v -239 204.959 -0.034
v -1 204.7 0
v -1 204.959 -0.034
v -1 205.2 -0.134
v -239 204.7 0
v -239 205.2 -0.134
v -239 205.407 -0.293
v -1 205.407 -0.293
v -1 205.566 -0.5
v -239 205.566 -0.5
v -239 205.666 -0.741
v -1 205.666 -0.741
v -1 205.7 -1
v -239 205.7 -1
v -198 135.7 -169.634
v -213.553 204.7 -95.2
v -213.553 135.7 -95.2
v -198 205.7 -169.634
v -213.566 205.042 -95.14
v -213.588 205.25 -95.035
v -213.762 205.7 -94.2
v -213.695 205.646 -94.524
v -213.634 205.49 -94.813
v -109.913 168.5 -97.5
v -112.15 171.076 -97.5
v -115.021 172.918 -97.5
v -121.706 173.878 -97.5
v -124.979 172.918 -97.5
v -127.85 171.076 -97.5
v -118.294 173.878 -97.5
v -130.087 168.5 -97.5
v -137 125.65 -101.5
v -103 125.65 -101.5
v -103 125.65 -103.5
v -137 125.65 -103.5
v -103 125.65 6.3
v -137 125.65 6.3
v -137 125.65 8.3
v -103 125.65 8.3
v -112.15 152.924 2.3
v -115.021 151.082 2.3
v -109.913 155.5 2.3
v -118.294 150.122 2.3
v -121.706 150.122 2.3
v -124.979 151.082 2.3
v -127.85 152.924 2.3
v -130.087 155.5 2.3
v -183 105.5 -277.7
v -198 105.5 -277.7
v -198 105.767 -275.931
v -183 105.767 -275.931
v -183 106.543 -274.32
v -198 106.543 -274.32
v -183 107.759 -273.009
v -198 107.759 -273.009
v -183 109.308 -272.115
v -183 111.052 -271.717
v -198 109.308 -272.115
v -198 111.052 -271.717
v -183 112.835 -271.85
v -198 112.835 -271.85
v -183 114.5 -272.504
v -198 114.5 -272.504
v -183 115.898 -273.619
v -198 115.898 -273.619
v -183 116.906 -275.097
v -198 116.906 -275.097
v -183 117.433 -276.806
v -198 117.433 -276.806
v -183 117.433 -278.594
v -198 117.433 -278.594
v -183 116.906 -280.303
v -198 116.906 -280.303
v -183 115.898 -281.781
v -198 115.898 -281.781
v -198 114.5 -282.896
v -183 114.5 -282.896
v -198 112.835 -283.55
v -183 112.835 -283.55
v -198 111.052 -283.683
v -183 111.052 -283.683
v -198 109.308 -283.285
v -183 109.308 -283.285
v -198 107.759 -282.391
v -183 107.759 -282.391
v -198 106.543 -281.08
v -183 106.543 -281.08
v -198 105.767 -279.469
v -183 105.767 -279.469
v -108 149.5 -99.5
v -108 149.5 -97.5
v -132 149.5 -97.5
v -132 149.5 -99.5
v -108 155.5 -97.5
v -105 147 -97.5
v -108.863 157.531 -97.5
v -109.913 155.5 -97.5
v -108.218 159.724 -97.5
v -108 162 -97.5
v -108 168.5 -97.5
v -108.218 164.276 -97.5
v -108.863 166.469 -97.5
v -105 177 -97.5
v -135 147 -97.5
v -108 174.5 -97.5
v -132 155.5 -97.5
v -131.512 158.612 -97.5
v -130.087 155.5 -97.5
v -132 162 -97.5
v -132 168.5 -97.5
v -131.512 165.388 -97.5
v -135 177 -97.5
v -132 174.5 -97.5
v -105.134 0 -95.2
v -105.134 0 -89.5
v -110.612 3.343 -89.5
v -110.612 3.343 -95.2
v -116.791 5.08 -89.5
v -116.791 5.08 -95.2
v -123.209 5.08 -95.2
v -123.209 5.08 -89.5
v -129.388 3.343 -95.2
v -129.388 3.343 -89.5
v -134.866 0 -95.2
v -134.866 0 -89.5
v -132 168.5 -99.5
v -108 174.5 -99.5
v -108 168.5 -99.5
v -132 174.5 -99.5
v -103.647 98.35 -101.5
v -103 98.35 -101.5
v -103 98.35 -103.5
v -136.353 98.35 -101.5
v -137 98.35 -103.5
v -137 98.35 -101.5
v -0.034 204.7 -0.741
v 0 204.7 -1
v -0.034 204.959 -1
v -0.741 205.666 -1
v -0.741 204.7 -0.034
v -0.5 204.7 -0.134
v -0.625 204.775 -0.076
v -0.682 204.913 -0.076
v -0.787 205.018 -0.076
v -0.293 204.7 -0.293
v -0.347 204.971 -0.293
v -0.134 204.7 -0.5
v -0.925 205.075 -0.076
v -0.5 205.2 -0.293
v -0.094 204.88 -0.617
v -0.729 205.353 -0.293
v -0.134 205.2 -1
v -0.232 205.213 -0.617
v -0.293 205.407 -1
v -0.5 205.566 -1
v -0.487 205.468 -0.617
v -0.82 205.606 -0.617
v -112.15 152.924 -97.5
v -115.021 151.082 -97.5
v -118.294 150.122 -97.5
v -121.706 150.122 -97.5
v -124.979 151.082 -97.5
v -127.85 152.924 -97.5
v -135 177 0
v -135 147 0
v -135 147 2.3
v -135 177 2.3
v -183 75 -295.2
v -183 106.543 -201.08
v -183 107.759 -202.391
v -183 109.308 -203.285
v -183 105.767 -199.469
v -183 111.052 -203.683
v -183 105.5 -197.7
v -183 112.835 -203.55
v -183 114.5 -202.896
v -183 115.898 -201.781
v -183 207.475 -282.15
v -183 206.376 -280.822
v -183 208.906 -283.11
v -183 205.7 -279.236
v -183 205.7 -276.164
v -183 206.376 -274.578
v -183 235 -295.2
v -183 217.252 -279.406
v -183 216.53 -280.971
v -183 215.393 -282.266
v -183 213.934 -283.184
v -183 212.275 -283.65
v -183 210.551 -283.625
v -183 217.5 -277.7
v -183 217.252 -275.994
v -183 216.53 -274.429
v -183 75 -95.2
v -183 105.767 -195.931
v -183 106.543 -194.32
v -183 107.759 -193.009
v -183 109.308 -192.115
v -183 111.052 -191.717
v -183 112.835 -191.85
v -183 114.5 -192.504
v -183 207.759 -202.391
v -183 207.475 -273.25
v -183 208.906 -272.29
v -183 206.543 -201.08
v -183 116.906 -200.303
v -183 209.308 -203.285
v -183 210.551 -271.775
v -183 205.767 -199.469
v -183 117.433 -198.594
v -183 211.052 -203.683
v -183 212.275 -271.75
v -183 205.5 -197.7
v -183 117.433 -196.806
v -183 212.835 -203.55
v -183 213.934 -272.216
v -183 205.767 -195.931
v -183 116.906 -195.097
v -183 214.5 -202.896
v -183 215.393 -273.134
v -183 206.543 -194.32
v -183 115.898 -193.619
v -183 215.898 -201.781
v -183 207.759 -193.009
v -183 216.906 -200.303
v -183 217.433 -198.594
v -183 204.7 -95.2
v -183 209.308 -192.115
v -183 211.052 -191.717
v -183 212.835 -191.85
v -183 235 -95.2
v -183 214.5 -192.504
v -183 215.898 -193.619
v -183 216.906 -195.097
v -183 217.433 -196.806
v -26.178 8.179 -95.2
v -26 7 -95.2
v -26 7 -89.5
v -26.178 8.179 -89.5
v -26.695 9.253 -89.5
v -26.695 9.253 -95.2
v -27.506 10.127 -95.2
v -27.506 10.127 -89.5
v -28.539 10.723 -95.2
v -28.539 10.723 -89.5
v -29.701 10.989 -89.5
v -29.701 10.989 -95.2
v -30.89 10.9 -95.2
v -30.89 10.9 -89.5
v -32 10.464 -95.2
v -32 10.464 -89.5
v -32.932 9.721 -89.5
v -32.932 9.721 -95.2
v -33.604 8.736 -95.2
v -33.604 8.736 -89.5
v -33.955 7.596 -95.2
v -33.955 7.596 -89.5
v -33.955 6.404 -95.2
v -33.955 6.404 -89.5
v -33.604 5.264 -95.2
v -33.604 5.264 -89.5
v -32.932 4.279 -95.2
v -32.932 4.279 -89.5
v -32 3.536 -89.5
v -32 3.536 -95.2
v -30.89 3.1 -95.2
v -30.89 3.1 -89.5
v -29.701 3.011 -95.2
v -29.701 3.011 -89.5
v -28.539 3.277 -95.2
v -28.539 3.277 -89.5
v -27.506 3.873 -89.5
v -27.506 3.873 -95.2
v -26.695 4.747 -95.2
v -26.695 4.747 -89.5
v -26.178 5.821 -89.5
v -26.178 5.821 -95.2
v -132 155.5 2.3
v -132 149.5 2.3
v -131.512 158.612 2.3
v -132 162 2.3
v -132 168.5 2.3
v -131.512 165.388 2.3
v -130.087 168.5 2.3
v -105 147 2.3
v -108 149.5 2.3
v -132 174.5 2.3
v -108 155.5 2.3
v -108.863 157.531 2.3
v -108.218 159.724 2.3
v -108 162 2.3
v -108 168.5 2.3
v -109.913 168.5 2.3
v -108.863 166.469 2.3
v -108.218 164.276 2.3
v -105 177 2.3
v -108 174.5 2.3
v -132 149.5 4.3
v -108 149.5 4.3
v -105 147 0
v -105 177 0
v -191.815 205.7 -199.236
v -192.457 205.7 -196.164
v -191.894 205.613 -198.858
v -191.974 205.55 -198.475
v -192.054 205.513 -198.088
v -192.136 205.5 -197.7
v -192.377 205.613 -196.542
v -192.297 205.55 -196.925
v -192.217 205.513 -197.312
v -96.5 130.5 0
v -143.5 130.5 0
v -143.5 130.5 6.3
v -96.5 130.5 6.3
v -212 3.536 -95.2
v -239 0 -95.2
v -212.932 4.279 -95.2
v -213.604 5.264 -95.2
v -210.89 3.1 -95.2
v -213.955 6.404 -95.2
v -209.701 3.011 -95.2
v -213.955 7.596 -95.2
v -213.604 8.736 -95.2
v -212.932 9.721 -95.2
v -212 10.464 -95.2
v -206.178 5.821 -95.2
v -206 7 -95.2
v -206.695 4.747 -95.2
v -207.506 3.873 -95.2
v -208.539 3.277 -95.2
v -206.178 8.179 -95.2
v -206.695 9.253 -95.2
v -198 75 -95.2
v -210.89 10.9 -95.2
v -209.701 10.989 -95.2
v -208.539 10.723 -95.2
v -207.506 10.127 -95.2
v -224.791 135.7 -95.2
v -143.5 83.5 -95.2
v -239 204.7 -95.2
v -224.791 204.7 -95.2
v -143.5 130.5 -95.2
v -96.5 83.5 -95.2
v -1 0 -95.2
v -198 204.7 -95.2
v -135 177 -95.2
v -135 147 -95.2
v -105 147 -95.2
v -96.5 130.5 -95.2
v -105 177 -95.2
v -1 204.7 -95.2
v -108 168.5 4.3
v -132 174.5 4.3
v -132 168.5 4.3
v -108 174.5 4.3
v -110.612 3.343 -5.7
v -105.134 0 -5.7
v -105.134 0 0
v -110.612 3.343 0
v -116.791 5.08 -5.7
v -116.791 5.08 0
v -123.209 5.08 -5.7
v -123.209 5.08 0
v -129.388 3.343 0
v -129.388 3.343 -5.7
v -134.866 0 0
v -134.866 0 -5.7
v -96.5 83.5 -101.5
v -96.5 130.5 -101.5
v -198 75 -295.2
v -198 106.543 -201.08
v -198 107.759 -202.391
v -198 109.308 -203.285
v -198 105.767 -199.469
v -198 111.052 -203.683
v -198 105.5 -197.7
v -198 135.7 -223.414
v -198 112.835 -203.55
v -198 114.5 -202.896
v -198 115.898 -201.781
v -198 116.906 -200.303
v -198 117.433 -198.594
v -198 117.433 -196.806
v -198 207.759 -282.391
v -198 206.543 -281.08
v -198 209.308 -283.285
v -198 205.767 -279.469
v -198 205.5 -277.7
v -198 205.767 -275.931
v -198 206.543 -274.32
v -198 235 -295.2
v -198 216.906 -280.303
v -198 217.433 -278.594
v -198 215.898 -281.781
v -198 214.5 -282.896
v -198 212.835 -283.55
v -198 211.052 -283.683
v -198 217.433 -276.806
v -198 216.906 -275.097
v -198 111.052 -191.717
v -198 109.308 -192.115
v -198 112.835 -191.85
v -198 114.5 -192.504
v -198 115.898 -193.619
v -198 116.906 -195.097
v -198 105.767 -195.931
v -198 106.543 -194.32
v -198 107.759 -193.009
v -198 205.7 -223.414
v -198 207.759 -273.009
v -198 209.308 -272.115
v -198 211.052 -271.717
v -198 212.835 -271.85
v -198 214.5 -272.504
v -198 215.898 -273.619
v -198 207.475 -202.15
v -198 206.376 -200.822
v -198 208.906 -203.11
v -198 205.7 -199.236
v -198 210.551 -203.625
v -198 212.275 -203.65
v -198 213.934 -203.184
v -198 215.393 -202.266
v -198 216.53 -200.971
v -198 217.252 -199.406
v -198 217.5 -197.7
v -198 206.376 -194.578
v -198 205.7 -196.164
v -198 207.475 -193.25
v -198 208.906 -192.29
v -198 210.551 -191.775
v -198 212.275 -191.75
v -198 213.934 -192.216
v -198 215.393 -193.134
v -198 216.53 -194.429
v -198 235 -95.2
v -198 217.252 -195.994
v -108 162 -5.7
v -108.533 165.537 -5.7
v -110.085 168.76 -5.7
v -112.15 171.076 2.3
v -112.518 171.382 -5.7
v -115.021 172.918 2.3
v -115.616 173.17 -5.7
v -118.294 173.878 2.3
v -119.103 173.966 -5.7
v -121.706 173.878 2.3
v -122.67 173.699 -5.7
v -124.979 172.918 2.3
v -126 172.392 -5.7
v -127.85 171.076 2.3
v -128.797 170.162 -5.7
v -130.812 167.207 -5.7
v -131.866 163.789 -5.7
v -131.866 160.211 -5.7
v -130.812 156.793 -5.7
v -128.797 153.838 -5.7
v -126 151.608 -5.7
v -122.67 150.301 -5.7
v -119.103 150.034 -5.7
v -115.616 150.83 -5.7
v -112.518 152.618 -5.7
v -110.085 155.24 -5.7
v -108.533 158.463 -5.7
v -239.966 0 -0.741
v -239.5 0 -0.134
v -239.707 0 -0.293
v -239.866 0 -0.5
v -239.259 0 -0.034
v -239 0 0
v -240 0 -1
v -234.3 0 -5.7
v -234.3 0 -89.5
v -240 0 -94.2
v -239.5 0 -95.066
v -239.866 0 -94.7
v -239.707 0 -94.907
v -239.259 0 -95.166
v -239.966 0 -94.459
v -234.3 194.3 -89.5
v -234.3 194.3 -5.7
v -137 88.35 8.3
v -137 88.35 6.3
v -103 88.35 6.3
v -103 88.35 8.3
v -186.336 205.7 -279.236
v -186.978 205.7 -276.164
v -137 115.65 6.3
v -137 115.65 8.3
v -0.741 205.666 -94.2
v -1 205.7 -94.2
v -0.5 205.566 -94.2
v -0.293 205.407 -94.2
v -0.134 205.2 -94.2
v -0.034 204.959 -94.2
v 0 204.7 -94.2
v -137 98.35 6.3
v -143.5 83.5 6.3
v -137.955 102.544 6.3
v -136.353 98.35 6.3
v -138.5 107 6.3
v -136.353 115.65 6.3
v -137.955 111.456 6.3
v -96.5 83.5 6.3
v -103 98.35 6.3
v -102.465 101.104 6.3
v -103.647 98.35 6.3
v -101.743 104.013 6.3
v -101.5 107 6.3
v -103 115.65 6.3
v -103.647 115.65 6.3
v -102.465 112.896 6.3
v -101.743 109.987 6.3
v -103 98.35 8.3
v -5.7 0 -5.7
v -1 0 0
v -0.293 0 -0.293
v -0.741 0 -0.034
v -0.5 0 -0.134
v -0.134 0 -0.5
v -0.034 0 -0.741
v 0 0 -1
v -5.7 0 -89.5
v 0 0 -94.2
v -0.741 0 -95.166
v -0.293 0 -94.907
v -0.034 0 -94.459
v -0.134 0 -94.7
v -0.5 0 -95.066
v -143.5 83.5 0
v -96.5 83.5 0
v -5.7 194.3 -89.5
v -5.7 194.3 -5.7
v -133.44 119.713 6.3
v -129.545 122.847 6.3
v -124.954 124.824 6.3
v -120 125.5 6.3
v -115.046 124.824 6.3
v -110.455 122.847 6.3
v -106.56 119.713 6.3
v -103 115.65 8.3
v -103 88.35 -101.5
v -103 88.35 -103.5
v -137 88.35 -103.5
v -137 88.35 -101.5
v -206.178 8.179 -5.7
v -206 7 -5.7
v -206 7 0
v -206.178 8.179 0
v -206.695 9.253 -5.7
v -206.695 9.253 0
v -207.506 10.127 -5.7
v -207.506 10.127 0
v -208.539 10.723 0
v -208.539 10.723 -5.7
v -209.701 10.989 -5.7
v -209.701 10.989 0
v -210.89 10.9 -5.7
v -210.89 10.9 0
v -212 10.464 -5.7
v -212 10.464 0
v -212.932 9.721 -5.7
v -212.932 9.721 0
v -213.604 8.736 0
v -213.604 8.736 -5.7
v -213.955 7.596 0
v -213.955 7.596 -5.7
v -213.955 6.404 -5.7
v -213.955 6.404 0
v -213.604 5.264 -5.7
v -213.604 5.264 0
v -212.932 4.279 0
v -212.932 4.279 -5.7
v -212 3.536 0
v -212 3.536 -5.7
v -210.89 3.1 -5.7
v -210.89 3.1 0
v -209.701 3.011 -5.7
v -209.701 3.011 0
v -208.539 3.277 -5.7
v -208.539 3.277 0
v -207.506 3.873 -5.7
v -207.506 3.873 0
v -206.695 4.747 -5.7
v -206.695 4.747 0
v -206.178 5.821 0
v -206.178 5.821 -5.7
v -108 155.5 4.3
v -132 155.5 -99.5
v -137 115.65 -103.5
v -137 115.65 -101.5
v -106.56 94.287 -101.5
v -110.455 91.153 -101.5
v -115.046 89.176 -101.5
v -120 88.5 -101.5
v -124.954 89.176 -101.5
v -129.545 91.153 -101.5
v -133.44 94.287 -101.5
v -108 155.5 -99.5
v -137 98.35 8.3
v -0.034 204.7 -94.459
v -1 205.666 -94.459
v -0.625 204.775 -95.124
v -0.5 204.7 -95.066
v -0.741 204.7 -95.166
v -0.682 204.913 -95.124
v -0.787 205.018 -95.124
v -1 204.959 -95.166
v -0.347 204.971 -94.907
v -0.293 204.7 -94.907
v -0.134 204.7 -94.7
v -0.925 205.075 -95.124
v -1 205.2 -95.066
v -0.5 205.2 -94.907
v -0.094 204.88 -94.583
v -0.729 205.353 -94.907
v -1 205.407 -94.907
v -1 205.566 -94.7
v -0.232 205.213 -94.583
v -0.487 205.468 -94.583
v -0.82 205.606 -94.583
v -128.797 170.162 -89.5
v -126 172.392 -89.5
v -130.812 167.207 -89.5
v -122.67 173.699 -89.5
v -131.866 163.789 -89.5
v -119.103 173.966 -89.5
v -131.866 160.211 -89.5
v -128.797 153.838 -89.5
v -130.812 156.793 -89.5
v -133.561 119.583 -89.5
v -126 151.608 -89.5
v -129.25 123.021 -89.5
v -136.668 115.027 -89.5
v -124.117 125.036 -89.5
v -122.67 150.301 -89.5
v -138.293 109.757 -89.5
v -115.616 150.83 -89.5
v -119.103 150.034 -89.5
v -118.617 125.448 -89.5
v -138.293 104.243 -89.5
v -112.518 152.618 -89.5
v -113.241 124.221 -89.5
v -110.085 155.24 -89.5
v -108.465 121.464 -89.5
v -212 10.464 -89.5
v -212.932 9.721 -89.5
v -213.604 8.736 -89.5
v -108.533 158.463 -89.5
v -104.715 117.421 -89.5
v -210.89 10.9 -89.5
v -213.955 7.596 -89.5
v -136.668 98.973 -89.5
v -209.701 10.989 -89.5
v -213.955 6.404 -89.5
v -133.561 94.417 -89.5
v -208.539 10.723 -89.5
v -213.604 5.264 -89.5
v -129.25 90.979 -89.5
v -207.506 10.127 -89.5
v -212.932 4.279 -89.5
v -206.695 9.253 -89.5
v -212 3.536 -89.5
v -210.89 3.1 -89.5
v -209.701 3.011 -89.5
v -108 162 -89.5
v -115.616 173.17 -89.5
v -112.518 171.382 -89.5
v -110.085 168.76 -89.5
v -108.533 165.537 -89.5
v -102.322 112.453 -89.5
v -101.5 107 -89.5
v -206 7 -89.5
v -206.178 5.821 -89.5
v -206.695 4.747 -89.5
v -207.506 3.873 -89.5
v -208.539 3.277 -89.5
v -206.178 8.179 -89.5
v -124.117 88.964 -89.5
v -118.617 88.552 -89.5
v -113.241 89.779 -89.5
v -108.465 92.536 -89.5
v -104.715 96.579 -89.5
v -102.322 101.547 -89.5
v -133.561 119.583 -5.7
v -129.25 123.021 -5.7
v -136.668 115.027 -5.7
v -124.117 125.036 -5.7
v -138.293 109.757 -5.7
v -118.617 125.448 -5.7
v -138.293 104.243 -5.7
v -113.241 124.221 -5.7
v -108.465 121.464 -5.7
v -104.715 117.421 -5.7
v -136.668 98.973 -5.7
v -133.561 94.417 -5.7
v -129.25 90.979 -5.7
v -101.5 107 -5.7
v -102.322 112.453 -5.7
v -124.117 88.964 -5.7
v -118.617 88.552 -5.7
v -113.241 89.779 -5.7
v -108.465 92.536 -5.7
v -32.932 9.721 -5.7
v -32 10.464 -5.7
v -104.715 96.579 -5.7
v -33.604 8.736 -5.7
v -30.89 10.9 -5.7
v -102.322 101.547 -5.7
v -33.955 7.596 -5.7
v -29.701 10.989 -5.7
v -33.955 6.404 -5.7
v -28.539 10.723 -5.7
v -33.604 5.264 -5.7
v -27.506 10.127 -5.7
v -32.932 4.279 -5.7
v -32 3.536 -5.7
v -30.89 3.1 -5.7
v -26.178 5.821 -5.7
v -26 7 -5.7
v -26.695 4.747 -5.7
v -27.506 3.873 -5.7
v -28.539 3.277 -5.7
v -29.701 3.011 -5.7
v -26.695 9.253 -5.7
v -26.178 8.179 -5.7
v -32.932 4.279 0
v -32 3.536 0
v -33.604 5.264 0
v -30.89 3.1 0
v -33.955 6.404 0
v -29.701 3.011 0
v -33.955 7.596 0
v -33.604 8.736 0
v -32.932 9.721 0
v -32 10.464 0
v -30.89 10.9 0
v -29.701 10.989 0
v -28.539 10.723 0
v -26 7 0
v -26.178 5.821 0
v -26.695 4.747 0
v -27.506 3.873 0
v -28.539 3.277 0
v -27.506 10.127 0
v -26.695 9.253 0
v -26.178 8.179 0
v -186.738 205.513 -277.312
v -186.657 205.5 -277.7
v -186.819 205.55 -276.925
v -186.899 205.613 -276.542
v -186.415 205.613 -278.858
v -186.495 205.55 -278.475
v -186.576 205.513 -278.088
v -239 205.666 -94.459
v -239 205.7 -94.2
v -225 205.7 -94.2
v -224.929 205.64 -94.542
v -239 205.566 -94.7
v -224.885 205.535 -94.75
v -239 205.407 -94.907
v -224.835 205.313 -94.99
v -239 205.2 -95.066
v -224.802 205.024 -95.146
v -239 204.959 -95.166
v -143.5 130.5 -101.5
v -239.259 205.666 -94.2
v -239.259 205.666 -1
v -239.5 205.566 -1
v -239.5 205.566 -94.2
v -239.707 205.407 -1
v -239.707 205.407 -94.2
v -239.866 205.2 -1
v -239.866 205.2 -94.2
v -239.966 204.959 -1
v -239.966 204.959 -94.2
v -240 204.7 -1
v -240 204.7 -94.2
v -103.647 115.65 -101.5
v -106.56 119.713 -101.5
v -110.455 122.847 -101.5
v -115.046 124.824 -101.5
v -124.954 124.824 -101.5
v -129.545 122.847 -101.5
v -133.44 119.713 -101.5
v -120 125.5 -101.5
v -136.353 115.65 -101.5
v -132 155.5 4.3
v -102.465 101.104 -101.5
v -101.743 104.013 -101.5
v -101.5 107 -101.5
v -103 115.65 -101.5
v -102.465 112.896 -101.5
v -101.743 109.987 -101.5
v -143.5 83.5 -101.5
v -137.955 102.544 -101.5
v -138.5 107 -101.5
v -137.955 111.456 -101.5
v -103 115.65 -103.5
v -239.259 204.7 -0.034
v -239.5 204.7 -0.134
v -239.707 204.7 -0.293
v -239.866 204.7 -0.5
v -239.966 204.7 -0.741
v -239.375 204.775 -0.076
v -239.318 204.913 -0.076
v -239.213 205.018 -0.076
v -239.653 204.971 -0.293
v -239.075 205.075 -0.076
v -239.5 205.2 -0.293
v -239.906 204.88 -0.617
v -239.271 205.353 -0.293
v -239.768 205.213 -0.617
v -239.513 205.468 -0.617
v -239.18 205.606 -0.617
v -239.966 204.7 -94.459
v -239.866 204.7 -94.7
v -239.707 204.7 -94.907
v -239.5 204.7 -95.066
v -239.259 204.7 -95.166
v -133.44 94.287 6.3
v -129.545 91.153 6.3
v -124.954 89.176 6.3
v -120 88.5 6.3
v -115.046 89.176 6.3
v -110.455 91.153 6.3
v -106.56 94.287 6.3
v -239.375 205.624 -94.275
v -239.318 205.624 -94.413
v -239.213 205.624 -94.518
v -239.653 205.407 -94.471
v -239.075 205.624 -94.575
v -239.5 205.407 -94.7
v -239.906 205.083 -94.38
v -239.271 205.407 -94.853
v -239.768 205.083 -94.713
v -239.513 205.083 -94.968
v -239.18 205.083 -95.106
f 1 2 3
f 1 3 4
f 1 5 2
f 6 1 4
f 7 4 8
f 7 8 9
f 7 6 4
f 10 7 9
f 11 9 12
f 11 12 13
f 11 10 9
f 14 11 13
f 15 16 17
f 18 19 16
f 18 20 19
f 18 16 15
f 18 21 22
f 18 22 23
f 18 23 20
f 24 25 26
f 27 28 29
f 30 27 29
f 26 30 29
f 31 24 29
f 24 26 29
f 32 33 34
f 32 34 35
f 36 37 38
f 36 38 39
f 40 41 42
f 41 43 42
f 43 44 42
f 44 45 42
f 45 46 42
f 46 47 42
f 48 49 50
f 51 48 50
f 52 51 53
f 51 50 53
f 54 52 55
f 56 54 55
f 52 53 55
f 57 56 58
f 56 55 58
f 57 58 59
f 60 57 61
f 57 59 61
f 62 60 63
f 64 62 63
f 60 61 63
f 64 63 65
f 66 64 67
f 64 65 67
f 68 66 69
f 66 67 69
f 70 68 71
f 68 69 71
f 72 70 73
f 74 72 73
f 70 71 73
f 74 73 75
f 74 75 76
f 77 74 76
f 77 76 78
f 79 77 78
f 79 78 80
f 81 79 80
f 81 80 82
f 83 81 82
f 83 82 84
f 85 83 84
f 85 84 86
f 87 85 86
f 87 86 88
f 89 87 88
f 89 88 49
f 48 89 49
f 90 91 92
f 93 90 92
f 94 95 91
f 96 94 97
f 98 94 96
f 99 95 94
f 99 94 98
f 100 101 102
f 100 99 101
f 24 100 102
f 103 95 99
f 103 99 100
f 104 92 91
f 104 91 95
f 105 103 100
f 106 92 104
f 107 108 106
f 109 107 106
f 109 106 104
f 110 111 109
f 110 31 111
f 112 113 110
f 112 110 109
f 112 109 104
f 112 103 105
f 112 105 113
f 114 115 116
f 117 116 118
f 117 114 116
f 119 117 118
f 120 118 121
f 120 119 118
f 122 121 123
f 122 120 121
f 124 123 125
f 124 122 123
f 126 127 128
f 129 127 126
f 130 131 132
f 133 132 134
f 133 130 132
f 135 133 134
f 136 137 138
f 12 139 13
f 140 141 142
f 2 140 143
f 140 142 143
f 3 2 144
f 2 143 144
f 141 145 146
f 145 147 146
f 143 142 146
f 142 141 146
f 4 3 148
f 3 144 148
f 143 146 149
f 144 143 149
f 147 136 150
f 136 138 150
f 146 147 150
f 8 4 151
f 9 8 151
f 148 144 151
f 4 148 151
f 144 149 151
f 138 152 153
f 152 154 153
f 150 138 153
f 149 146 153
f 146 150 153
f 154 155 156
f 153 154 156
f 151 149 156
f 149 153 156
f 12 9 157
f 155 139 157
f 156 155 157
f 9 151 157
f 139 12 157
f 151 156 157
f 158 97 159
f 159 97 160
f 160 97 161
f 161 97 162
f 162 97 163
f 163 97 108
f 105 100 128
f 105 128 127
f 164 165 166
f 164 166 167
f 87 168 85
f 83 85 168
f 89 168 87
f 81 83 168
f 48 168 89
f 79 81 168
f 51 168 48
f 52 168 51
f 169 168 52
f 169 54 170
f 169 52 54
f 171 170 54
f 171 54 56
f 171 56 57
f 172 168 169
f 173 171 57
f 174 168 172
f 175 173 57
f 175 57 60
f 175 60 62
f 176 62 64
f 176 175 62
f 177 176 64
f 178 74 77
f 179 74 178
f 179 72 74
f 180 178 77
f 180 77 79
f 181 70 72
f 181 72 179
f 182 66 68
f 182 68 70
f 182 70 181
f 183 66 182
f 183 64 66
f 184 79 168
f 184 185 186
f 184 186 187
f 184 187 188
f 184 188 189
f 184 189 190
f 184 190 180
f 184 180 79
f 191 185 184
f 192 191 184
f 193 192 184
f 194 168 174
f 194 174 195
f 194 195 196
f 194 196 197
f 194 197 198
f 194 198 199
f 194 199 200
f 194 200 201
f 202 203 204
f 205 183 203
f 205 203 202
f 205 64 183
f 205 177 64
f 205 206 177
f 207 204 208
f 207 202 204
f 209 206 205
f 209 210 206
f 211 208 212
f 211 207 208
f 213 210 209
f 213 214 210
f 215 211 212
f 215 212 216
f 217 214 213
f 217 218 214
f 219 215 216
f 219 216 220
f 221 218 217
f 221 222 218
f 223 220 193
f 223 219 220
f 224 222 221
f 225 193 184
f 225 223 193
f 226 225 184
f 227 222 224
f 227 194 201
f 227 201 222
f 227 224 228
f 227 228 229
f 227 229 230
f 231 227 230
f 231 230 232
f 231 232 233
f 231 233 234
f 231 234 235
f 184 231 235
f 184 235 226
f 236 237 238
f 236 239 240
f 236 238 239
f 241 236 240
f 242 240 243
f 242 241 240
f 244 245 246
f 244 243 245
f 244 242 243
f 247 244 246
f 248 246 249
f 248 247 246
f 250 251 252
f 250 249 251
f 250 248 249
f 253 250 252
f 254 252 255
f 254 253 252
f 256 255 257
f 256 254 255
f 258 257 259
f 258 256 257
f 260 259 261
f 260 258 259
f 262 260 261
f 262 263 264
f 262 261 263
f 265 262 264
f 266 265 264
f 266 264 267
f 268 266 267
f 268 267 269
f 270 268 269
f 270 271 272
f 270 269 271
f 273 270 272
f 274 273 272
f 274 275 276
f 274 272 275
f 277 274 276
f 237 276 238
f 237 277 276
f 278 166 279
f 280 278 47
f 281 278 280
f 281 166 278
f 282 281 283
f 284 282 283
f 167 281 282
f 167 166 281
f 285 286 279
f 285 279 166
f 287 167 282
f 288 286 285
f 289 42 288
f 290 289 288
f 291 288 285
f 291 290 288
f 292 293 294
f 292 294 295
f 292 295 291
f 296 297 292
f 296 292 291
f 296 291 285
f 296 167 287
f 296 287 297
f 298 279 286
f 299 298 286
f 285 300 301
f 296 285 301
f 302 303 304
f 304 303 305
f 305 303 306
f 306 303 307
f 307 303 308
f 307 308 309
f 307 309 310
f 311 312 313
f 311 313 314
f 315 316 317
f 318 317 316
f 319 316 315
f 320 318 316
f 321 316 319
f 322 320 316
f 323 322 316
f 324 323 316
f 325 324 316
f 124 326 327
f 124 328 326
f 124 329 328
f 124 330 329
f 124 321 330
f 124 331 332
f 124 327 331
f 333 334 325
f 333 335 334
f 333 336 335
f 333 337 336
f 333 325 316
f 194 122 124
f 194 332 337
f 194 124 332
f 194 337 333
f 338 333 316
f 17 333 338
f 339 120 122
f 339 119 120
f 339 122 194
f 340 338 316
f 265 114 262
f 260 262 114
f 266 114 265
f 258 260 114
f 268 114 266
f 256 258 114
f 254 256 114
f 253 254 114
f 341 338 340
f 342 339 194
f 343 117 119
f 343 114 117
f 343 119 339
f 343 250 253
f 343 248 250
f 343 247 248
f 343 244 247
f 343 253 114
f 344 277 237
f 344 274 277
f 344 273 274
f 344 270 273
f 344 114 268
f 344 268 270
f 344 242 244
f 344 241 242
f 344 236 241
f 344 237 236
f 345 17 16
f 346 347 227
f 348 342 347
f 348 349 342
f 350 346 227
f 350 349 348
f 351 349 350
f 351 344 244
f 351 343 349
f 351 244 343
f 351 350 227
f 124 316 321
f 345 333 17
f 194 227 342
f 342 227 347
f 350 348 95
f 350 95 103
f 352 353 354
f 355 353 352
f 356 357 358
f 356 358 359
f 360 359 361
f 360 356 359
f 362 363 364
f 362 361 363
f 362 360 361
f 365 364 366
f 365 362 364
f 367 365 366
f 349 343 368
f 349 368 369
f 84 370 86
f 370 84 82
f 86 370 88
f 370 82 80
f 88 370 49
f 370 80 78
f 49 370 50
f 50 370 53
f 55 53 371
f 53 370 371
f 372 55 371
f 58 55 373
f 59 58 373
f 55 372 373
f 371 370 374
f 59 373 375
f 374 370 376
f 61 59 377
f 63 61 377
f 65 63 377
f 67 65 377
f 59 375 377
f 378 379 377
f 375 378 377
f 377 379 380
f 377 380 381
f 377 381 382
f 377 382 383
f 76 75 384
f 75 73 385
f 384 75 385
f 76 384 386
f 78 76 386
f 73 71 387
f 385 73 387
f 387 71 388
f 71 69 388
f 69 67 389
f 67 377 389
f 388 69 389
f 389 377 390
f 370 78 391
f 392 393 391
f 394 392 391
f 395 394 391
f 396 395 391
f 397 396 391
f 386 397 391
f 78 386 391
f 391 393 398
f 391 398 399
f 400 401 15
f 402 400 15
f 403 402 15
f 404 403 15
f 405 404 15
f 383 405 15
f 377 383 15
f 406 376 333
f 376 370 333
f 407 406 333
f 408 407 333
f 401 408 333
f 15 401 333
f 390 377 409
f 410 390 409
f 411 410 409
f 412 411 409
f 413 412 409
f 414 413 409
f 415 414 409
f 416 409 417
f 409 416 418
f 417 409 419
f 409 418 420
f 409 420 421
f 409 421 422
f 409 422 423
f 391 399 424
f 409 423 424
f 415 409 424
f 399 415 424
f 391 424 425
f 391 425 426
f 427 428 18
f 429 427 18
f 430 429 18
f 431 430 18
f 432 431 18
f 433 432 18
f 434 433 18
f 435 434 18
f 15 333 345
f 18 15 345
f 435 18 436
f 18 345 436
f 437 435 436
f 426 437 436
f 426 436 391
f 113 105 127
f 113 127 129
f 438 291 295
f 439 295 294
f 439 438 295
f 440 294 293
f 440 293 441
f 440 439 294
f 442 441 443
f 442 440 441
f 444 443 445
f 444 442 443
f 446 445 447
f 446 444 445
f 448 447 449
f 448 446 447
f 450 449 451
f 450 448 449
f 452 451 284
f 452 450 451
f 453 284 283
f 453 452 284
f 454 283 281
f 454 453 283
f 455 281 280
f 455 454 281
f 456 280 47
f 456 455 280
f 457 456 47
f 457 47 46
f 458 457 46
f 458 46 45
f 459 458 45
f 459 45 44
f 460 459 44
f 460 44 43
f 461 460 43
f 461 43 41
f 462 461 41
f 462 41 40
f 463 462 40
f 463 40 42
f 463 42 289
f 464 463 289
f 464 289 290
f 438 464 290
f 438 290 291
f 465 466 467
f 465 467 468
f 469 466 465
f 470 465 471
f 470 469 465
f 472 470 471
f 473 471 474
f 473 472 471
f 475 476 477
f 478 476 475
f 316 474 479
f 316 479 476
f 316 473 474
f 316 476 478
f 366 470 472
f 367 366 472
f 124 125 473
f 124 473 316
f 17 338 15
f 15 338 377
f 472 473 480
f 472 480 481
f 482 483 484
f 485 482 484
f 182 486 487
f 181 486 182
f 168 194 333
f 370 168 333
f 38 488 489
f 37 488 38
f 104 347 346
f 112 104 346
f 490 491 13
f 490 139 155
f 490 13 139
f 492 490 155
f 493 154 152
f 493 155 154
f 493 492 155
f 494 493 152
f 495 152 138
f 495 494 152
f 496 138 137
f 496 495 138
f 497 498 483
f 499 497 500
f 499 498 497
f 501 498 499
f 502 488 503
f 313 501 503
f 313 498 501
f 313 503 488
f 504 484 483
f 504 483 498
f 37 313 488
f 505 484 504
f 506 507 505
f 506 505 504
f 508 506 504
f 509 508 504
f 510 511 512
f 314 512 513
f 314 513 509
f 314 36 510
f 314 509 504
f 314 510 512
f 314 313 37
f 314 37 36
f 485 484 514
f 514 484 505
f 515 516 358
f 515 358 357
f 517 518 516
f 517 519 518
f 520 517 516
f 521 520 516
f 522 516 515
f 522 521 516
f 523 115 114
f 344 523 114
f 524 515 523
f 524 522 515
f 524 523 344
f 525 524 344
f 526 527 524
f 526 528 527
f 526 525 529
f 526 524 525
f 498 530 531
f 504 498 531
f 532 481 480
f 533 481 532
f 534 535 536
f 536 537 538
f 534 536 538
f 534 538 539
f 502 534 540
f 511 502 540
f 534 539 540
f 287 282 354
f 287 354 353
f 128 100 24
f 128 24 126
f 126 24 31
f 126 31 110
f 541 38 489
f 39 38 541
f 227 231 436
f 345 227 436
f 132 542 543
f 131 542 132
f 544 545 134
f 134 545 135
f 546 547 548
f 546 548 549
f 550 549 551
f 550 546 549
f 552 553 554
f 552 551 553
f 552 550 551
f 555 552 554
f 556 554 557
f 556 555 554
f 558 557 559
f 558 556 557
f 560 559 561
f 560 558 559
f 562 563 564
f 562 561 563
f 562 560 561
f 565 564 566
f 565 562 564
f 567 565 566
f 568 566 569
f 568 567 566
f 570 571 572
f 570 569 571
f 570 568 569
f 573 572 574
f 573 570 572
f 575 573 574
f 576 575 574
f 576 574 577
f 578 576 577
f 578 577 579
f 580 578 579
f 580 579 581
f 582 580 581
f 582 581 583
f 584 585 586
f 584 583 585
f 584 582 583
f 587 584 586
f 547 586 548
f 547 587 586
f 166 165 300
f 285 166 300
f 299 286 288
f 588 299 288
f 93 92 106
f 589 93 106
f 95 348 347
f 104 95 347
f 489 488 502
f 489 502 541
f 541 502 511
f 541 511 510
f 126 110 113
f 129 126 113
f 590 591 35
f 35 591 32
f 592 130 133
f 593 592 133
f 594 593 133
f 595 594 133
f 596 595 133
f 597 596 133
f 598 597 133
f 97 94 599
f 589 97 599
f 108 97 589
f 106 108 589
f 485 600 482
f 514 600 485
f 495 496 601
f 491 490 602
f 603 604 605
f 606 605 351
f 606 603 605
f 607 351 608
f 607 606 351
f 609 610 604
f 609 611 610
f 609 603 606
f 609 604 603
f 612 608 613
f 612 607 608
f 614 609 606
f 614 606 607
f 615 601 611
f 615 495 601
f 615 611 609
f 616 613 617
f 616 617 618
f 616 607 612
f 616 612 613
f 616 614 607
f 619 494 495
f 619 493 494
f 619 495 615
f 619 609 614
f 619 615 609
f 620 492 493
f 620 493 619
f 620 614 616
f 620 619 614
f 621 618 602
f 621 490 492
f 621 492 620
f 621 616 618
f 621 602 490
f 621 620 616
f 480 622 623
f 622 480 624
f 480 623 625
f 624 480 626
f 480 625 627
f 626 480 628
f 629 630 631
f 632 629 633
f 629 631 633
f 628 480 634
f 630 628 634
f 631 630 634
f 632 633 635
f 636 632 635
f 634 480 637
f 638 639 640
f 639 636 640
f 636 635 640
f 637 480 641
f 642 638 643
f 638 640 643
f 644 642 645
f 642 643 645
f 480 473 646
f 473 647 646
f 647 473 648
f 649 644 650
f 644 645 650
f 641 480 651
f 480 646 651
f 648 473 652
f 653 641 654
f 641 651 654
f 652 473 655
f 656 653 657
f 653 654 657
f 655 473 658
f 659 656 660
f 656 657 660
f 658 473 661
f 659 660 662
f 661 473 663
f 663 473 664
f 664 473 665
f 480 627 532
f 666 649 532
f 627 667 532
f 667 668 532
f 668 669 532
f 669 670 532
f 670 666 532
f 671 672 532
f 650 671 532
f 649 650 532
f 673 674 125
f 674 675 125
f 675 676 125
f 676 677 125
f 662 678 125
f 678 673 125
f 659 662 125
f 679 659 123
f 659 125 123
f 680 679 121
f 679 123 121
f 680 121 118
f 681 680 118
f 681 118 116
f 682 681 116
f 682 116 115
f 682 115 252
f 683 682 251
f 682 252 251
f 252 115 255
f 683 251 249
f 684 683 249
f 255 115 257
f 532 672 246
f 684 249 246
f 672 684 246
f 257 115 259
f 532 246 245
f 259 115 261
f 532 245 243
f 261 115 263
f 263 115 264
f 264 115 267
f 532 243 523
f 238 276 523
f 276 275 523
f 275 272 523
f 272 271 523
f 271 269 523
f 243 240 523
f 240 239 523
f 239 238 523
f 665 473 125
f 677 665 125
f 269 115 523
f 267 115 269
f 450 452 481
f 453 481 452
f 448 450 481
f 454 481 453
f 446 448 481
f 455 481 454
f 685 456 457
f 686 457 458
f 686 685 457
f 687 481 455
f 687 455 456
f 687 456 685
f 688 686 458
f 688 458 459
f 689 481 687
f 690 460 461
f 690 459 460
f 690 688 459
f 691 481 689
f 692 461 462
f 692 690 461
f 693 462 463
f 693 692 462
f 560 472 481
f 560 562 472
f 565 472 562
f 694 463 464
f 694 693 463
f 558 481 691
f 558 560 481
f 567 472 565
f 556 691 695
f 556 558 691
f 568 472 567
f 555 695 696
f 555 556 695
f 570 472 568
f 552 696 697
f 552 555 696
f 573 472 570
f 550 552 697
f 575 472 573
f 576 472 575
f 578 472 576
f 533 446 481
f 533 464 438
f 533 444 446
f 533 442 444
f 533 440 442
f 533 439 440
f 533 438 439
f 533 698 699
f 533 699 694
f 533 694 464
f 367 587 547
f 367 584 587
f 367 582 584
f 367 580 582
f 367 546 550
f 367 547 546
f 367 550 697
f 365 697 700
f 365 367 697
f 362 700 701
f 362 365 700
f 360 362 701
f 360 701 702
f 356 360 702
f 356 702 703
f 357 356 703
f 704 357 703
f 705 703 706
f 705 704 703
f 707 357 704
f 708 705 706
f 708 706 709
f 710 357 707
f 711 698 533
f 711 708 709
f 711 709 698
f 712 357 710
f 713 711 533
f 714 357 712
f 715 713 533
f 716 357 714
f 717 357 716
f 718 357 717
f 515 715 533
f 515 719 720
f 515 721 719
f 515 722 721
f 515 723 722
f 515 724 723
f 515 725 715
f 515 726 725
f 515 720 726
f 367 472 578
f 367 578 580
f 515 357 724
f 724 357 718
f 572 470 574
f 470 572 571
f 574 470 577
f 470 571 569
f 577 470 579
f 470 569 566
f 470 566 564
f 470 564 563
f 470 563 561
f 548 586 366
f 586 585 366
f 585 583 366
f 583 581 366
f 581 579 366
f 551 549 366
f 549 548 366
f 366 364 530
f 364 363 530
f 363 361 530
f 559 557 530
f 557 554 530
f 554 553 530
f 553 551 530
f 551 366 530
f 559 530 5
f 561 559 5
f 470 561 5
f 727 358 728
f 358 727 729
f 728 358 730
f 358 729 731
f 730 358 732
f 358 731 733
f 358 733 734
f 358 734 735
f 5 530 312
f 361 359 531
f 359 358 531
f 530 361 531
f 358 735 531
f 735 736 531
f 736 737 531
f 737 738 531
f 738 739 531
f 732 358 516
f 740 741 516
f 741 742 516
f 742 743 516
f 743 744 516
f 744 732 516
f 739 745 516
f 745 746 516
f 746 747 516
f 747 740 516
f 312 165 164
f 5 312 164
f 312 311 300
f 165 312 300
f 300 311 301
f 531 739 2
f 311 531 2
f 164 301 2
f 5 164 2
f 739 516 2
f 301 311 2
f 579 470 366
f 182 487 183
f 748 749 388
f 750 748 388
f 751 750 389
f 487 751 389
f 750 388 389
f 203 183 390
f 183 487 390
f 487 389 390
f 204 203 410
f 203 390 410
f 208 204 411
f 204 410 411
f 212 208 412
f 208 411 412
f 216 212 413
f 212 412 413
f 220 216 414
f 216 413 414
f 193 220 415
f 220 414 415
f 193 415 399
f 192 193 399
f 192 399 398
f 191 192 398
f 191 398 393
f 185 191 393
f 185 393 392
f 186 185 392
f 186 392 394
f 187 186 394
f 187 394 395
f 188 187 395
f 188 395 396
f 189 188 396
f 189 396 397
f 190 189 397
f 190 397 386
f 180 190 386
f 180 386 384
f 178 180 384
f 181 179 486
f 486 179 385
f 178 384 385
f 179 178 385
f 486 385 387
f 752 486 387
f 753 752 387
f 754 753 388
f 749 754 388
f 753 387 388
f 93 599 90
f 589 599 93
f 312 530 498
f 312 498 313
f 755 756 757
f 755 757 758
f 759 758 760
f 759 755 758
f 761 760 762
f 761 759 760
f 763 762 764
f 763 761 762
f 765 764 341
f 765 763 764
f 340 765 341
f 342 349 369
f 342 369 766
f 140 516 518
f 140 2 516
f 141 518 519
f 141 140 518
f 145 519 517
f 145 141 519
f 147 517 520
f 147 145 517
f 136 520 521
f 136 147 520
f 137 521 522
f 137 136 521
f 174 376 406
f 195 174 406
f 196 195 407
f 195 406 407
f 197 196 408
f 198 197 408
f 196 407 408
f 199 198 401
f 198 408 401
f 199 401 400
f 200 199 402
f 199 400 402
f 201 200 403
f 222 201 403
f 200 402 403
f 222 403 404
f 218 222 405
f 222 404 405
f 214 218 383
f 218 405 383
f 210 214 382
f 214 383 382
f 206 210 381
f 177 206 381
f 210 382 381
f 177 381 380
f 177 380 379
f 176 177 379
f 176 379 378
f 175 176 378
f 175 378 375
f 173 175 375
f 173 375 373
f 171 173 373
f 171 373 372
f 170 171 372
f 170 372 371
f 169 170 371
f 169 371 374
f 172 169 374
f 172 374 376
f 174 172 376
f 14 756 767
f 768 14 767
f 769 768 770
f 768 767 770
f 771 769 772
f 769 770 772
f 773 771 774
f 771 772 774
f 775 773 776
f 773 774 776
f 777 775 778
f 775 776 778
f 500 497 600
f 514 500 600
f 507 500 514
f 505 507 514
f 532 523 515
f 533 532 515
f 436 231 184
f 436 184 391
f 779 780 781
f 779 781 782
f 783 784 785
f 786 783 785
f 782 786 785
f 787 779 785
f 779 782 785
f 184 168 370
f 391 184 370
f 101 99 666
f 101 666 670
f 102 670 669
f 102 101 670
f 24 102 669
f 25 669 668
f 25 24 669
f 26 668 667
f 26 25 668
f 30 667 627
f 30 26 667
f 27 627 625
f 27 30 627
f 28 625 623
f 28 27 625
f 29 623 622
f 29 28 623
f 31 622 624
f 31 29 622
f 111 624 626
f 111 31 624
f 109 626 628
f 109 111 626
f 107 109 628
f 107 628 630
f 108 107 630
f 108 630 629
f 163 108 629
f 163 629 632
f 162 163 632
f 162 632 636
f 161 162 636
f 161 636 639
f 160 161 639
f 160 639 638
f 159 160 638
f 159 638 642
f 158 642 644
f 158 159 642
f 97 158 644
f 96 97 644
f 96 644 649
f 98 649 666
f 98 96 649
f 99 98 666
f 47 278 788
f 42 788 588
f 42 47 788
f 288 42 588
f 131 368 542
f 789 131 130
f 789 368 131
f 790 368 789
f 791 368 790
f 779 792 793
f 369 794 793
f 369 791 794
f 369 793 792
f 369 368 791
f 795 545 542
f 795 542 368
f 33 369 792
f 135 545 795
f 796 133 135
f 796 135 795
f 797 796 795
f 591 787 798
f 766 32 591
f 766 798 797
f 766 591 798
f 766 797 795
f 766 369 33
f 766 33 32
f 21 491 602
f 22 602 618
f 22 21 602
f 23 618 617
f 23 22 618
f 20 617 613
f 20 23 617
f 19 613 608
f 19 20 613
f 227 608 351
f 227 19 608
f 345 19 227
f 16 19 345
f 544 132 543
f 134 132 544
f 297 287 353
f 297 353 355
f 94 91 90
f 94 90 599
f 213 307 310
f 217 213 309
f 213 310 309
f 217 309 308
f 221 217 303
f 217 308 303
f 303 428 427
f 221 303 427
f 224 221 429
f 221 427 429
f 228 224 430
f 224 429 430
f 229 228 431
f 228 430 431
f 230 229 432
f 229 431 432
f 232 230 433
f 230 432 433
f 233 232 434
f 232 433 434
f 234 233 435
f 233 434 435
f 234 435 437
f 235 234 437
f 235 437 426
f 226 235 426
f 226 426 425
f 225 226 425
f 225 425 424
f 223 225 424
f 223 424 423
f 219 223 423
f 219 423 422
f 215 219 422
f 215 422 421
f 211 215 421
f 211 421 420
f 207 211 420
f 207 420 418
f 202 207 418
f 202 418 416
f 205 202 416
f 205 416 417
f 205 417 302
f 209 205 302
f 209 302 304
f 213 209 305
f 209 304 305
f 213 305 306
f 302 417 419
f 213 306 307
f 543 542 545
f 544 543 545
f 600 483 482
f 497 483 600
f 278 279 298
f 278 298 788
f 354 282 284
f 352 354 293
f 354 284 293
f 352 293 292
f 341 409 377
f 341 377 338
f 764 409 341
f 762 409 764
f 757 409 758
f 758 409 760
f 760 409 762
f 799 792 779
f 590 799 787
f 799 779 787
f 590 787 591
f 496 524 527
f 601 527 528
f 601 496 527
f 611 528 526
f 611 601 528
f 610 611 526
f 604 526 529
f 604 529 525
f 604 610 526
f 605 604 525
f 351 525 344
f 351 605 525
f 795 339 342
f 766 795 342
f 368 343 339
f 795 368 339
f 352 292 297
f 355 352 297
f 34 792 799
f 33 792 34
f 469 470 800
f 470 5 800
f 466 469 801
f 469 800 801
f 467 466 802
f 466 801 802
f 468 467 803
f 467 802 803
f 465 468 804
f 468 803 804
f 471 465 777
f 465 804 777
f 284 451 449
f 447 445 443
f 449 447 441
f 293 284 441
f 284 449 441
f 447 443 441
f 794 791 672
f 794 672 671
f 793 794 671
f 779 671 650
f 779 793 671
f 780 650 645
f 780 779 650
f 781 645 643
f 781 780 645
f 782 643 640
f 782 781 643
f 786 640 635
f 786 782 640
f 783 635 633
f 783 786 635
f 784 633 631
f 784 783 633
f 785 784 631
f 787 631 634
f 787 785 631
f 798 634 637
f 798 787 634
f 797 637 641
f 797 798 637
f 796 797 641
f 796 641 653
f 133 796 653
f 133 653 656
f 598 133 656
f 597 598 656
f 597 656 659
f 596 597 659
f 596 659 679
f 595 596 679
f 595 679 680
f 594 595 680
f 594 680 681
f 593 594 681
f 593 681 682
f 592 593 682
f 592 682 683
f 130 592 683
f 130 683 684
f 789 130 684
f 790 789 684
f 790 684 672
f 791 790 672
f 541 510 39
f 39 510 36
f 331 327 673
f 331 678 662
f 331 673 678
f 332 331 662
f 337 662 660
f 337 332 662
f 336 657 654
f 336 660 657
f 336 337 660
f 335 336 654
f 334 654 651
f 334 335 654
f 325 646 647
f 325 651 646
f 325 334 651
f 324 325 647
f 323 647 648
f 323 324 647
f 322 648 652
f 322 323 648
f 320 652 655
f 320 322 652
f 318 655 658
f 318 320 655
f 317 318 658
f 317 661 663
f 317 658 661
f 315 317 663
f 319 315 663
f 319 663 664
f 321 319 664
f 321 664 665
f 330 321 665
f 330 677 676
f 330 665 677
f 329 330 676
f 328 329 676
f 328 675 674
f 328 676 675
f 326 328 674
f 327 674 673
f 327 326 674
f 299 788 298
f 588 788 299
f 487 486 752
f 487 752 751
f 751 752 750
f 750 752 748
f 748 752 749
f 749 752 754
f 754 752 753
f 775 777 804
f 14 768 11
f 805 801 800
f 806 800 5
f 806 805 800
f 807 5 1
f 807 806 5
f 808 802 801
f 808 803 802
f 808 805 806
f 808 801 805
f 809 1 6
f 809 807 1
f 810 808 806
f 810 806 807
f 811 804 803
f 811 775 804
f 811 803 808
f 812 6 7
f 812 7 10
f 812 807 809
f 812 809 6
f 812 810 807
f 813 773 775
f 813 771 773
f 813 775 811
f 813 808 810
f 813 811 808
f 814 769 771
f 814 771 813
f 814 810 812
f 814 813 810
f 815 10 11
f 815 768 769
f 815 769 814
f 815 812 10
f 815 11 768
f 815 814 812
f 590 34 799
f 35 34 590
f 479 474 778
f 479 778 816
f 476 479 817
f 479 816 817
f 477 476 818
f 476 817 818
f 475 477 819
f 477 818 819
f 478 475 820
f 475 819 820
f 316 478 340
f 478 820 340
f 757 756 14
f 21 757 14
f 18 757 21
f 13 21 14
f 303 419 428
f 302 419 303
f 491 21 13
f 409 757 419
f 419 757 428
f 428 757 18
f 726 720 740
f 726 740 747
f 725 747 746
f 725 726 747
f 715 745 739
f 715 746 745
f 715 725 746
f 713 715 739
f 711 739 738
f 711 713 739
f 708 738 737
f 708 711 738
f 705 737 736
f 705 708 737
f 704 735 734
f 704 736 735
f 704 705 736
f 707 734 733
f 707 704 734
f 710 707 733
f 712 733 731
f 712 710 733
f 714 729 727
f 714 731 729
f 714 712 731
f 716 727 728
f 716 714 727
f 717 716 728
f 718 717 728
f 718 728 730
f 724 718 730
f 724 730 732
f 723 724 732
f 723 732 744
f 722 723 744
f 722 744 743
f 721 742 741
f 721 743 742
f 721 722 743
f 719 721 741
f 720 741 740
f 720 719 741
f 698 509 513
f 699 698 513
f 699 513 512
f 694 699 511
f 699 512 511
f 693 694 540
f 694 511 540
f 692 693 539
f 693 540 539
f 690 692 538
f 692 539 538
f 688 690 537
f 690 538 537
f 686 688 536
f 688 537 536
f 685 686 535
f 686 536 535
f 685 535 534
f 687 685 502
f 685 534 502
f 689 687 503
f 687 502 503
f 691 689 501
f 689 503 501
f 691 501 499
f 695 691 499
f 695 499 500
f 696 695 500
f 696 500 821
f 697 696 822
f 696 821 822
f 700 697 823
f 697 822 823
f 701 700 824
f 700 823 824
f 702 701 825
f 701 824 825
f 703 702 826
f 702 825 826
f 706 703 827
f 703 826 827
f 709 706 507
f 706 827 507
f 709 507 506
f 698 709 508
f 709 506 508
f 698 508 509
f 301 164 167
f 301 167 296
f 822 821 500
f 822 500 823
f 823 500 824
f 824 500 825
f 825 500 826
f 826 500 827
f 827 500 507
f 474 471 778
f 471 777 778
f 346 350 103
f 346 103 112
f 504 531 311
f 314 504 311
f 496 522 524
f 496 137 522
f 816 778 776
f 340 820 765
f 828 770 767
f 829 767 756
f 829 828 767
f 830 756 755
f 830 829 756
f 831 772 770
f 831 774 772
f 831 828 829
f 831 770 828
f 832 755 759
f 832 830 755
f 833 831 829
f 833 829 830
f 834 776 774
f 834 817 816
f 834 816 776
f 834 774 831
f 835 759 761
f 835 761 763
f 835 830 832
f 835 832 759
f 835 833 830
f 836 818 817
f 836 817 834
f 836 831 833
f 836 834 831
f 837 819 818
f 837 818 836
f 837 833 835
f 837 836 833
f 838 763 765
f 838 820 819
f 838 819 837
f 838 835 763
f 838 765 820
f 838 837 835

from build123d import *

# Parameters (mm, degrees)
SKETCH1_W               = 95.2
SKETCH1_H               = 205.7
BOSS_EXTRUDE1_DEPTH     = 240
SKETCH2_W               = 228.6
SKETCH2_H               = 83.8
CUT_EXTRUDE1_DEPTH      = 194.3
FILLET1_R               = 1
SKETCH3_R               = 18.5
CUT_EXTRUDE2_DEPTH      = 331.114419558
SKETCH4_W               = 47
SKETCH4_H               = 47
BOSS_EXTRUDE2_DEPTH     = 6.3
SKETCH6_W               = 47
SKETCH6_H               = 47
BOSS_EXTRUDE3_DEPTH     = 6.3
CUT_EXTRUDE3_DEPTH      = 332.986053924
CUT_EXTRUDE3_DEPTH_BACK = 332.986053924
SKETCH7_R               = 18.5
CUT_EXTRUDE4_DEPTH      = 332.986053924
CUT_EXTRUDE4_DEPTH_BACK = 332.986053924
SKETCH8_R               = 23.5
CUT_EXTRUDE5_DEPTH      = 332.986053924
CUT_EXTRUDE5_DEPTH_BACK = 332.986053924
SKETCH9_R               = 12
SKETCH10_W              = 30
SKETCH10_H              = 30
BOSS_EXTRUDE5_DEPTH     = 2.3
SKETCH11_W              = 30
SKETCH11_H              = 30
BOSS_EXTRUDE6_DEPTH     = 2.3
CUT_EXTRUDE6_DEPTH      = 332.986053924
CUT_EXTRUDE6_DEPTH_BACK = 332.986053924
SKETCH12_R              = 12
CUT_EXTRUDE7_DEPTH      = 332.986053924
CUT_EXTRUDE7_DEPTH_BACK = 332.986053924
SKETCH14_R              = 4
SKETCH15_W              = 34
SKETCH15_H              = 10
BOSS_EXTRUDE7_DEPTH     = 2
SKETCH17_W              = 34
SKETCH17_H              = 10
BOSS_EXTRUDE14_DEPTH    = 2
SKETCH18_W              = 24
SKETCH18_H              = 6
BOSS_EXTRUDE17_DEPTH    = 2
SKETCH19_W              = 24
SKETCH19_H              = 6
BOSS_EXTRUDE18_DEPTH    = 2
SKETCH20_W              = 15
SKETCH20_H              = 160
BOSS_EXTRUDE19_DEPTH    = 200
SKETCH21_R              = 6
CUT_EXTRUDE8_DEPTH      = 20
BOSS_EXTRUDE20_DEPTH    = 70


with BuildPart() as part:
    # Sketch1 → Boss-Extrude1 (new body)
    with BuildSketch(Plane(origin=(0, 0, 0), x_dir=(0, 0, -1), z_dir=(1, 0, 0))):
        with Locations((47.6, 102.85)):
            Rectangle(SKETCH1_W, SKETCH1_H)
    extrude(amount=-BOSS_EXTRUDE1_DEPTH)

    # Sketch2 → Cut-Extrude1 (cut)
    with BuildSketch(Plane.XZ):
        with Locations((-120, -47.6)):
            Rectangle(SKETCH2_W, SKETCH2_H)
    extrude(amount=-CUT_EXTRUDE1_DEPTH, mode=Mode.SUBTRACT)

    # Fillet1
    fillet1_edges = [part.edges().sort_by_distance(p)[0] for p in [
        (-240, 102.85, -95.2),
        (-240, 205.7, -47.6),
        (-240, 102.85, 0),
        (0, 205.7, -47.6),
        (0, 102.85, -95.2),
        (0, 102.85, 0),
        (-120, 205.7, 0),
        (-120, 205.7, -95.2),
    ]]
    fillet(fillet1_edges, radius=FILLET1_R)

    # Sketch3 → Cut-Extrude2 (cut, through all)
    with BuildSketch(Plane.XY):
        with Locations((-120, 107)):
            Circle(SKETCH3_R)
    extrude(amount=-CUT_EXTRUDE2_DEPTH, mode=Mode.SUBTRACT)

    # Sketch4 → Boss-Extrude2 (add)
    with BuildSketch(Plane.XY):
        with Locations((-120, 107)):
            Rectangle(SKETCH4_W, SKETCH4_H)
    extrude(amount=BOSS_EXTRUDE2_DEPTH)

    # Sketch6 → Boss-Extrude3 (add)
    with BuildSketch(Plane(origin=(0, 0, -95.2), x_dir=(-1, 0, 0), z_dir=(0, 0, -1))):
        with Locations((120, 107)):
            Rectangle(SKETCH6_W, SKETCH6_H)
    extrude(amount=BOSS_EXTRUDE3_DEPTH)

    # Sketch7 → Cut-Extrude3 (cut, two sides: drawn at the far end of the back side and taken through both)
    with BuildSketch(Plane.XY.offset(-CUT_EXTRUDE3_DEPTH_BACK)):
        with Locations((-120, 107)):
            Circle(SKETCH7_R)
    extrude(amount=CUT_EXTRUDE3_DEPTH + CUT_EXTRUDE3_DEPTH_BACK, mode=Mode.SUBTRACT)

    # Sketch8 → Cut-Extrude4 (cut, two sides: drawn at the far end of the back side and taken through both)
    with BuildSketch(Plane.XY.offset(-CUT_EXTRUDE4_DEPTH_BACK)):
        with Locations((-120, -18.2)):
            Circle(SKETCH8_R)
    extrude(amount=CUT_EXTRUDE4_DEPTH + CUT_EXTRUDE4_DEPTH_BACK, mode=Mode.SUBTRACT)

    # Sketch9 → Cut-Extrude5 (cut, two sides: drawn at the far end of the back side and taken through both)
    with BuildSketch(Plane.XY.offset(-CUT_EXTRUDE5_DEPTH_BACK)):
        with Locations((-120, 162)):
            Circle(SKETCH9_R)
    extrude(amount=CUT_EXTRUDE5_DEPTH + CUT_EXTRUDE5_DEPTH_BACK, mode=Mode.SUBTRACT)

    # Sketch10 → Boss-Extrude5 (add)
    with BuildSketch(Plane.XY):
        with Locations((-120, 162)):
            Rectangle(SKETCH10_W, SKETCH10_H)
    extrude(amount=BOSS_EXTRUDE5_DEPTH)

    # Sketch11 → Boss-Extrude6 (add)
    with BuildSketch(Plane(origin=(0, 0, -95.2), x_dir=(-1, 0, 0), z_dir=(0, 0, -1))):
        with Locations((120, 162)):
            Rectangle(SKETCH11_W, SKETCH11_H)
    extrude(amount=BOSS_EXTRUDE6_DEPTH)

    # Sketch12 → Cut-Extrude6 (cut, two sides: drawn at the far end of the back side and taken through both)
    with BuildSketch(Plane.XY.offset(-CUT_EXTRUDE6_DEPTH_BACK)):
        with Locations((-120, 162)):
            Circle(SKETCH12_R)
    extrude(amount=CUT_EXTRUDE6_DEPTH + CUT_EXTRUDE6_DEPTH_BACK, mode=Mode.SUBTRACT)

    # Sketch14 → Cut-Extrude7 (cut, two sides: drawn at the far end of the back side and taken through both)
    with BuildSketch(Plane.XY.offset(-CUT_EXTRUDE7_DEPTH_BACK)):
        with Locations((-30, 7)):
            Circle(SKETCH14_R)
        with Locations((-210, 7)):
            Circle(SKETCH14_R)
    extrude(amount=CUT_EXTRUDE7_DEPTH + CUT_EXTRUDE7_DEPTH_BACK, mode=Mode.SUBTRACT)

    # Sketch15 → Boss-Extrude7 (add)
    with BuildSketch(Plane(origin=(0, 0, -101.5), x_dir=(-1, 0, 0), z_dir=(0, 0, -1))):
        with Locations((120, 93.35)):
            Rectangle(SKETCH15_W, SKETCH15_H)
        with Locations((120, 120.65)):
            Rectangle(SKETCH15_W, SKETCH15_H)
    extrude(amount=BOSS_EXTRUDE7_DEPTH)

    # Sketch17 → Boss-Extrude14 (add)
    with BuildSketch(Plane.XY.offset(6.3)):
        with Locations((-120, 93.35)):
            Rectangle(SKETCH17_W, SKETCH17_H)
        with Locations((-120, 120.65)):
            Rectangle(SKETCH17_W, SKETCH17_H)
    extrude(amount=BOSS_EXTRUDE14_DEPTH)

    # Sketch18 → Boss-Extrude17 (add)
    with BuildSketch(Plane.XY.offset(2.3)):
        with Locations((-120, 152.5)):
            Rectangle(SKETCH18_W, SKETCH18_H)
        with Locations((-120, 171.5)):
            Rectangle(SKETCH18_W, SKETCH18_H)
    extrude(amount=BOSS_EXTRUDE17_DEPTH)

    # Sketch19 → Boss-Extrude18 (add)
    with BuildSketch(Plane(origin=(0, 0, -97.5), x_dir=(-1, 0, 0), z_dir=(0, 0, -1))):
        with Locations((120, 152.5)):
            Rectangle(SKETCH19_W, SKETCH19_H)
        with Locations((120, 171.5)):
            Rectangle(SKETCH19_W, SKETCH19_H)
    extrude(amount=BOSS_EXTRUDE18_DEPTH)

    # Sketch20 → Boss-Extrude19 (add)
    with BuildSketch(Plane(origin=(0, 0, -95.2), x_dir=(-1, 0, 0), z_dir=(0, 0, -1))):
        with Locations((190.5, 155)):
            Rectangle(SKETCH20_W, SKETCH20_H)
    extrude(amount=BOSS_EXTRUDE19_DEPTH)

    # Sketch21 → Cut-Extrude8 (cut)
    with BuildSketch(Plane.ZY.offset(198)):
        with Locations(Location((-277.7, 211.5, 0), (0, 0, 270))):
            Circle(SKETCH21_R)
        with Locations(Location((-197.7, 211.5, 0), (0, 0, 270))):
            Circle(SKETCH21_R)
        with Locations(Location((-277.7, 111.5, 0), (0, 0, 270))):
            Circle(SKETCH21_R)
        with Locations(Location((-197.7, 111.5, 0), (0, 0, 270))):
            Circle(SKETCH21_R)
    extrude(amount=-CUT_EXTRUDE8_DEPTH, mode=Mode.SUBTRACT)

    # Sketch22 → Boss-Extrude20 (add)
    with BuildSketch(Plane(origin=(0, 205.7, 0), x_dir=(1, 0, 0), z_dir=(0, 1, 0))):
        Polygon((-183, 295.2), (-225, 94.2), (-213.762423012, 94.2), (-183, 241.420167273), align=None)
    extrude(amount=-BOSS_EXTRUDE20_DEPTH)


solid = part.part
